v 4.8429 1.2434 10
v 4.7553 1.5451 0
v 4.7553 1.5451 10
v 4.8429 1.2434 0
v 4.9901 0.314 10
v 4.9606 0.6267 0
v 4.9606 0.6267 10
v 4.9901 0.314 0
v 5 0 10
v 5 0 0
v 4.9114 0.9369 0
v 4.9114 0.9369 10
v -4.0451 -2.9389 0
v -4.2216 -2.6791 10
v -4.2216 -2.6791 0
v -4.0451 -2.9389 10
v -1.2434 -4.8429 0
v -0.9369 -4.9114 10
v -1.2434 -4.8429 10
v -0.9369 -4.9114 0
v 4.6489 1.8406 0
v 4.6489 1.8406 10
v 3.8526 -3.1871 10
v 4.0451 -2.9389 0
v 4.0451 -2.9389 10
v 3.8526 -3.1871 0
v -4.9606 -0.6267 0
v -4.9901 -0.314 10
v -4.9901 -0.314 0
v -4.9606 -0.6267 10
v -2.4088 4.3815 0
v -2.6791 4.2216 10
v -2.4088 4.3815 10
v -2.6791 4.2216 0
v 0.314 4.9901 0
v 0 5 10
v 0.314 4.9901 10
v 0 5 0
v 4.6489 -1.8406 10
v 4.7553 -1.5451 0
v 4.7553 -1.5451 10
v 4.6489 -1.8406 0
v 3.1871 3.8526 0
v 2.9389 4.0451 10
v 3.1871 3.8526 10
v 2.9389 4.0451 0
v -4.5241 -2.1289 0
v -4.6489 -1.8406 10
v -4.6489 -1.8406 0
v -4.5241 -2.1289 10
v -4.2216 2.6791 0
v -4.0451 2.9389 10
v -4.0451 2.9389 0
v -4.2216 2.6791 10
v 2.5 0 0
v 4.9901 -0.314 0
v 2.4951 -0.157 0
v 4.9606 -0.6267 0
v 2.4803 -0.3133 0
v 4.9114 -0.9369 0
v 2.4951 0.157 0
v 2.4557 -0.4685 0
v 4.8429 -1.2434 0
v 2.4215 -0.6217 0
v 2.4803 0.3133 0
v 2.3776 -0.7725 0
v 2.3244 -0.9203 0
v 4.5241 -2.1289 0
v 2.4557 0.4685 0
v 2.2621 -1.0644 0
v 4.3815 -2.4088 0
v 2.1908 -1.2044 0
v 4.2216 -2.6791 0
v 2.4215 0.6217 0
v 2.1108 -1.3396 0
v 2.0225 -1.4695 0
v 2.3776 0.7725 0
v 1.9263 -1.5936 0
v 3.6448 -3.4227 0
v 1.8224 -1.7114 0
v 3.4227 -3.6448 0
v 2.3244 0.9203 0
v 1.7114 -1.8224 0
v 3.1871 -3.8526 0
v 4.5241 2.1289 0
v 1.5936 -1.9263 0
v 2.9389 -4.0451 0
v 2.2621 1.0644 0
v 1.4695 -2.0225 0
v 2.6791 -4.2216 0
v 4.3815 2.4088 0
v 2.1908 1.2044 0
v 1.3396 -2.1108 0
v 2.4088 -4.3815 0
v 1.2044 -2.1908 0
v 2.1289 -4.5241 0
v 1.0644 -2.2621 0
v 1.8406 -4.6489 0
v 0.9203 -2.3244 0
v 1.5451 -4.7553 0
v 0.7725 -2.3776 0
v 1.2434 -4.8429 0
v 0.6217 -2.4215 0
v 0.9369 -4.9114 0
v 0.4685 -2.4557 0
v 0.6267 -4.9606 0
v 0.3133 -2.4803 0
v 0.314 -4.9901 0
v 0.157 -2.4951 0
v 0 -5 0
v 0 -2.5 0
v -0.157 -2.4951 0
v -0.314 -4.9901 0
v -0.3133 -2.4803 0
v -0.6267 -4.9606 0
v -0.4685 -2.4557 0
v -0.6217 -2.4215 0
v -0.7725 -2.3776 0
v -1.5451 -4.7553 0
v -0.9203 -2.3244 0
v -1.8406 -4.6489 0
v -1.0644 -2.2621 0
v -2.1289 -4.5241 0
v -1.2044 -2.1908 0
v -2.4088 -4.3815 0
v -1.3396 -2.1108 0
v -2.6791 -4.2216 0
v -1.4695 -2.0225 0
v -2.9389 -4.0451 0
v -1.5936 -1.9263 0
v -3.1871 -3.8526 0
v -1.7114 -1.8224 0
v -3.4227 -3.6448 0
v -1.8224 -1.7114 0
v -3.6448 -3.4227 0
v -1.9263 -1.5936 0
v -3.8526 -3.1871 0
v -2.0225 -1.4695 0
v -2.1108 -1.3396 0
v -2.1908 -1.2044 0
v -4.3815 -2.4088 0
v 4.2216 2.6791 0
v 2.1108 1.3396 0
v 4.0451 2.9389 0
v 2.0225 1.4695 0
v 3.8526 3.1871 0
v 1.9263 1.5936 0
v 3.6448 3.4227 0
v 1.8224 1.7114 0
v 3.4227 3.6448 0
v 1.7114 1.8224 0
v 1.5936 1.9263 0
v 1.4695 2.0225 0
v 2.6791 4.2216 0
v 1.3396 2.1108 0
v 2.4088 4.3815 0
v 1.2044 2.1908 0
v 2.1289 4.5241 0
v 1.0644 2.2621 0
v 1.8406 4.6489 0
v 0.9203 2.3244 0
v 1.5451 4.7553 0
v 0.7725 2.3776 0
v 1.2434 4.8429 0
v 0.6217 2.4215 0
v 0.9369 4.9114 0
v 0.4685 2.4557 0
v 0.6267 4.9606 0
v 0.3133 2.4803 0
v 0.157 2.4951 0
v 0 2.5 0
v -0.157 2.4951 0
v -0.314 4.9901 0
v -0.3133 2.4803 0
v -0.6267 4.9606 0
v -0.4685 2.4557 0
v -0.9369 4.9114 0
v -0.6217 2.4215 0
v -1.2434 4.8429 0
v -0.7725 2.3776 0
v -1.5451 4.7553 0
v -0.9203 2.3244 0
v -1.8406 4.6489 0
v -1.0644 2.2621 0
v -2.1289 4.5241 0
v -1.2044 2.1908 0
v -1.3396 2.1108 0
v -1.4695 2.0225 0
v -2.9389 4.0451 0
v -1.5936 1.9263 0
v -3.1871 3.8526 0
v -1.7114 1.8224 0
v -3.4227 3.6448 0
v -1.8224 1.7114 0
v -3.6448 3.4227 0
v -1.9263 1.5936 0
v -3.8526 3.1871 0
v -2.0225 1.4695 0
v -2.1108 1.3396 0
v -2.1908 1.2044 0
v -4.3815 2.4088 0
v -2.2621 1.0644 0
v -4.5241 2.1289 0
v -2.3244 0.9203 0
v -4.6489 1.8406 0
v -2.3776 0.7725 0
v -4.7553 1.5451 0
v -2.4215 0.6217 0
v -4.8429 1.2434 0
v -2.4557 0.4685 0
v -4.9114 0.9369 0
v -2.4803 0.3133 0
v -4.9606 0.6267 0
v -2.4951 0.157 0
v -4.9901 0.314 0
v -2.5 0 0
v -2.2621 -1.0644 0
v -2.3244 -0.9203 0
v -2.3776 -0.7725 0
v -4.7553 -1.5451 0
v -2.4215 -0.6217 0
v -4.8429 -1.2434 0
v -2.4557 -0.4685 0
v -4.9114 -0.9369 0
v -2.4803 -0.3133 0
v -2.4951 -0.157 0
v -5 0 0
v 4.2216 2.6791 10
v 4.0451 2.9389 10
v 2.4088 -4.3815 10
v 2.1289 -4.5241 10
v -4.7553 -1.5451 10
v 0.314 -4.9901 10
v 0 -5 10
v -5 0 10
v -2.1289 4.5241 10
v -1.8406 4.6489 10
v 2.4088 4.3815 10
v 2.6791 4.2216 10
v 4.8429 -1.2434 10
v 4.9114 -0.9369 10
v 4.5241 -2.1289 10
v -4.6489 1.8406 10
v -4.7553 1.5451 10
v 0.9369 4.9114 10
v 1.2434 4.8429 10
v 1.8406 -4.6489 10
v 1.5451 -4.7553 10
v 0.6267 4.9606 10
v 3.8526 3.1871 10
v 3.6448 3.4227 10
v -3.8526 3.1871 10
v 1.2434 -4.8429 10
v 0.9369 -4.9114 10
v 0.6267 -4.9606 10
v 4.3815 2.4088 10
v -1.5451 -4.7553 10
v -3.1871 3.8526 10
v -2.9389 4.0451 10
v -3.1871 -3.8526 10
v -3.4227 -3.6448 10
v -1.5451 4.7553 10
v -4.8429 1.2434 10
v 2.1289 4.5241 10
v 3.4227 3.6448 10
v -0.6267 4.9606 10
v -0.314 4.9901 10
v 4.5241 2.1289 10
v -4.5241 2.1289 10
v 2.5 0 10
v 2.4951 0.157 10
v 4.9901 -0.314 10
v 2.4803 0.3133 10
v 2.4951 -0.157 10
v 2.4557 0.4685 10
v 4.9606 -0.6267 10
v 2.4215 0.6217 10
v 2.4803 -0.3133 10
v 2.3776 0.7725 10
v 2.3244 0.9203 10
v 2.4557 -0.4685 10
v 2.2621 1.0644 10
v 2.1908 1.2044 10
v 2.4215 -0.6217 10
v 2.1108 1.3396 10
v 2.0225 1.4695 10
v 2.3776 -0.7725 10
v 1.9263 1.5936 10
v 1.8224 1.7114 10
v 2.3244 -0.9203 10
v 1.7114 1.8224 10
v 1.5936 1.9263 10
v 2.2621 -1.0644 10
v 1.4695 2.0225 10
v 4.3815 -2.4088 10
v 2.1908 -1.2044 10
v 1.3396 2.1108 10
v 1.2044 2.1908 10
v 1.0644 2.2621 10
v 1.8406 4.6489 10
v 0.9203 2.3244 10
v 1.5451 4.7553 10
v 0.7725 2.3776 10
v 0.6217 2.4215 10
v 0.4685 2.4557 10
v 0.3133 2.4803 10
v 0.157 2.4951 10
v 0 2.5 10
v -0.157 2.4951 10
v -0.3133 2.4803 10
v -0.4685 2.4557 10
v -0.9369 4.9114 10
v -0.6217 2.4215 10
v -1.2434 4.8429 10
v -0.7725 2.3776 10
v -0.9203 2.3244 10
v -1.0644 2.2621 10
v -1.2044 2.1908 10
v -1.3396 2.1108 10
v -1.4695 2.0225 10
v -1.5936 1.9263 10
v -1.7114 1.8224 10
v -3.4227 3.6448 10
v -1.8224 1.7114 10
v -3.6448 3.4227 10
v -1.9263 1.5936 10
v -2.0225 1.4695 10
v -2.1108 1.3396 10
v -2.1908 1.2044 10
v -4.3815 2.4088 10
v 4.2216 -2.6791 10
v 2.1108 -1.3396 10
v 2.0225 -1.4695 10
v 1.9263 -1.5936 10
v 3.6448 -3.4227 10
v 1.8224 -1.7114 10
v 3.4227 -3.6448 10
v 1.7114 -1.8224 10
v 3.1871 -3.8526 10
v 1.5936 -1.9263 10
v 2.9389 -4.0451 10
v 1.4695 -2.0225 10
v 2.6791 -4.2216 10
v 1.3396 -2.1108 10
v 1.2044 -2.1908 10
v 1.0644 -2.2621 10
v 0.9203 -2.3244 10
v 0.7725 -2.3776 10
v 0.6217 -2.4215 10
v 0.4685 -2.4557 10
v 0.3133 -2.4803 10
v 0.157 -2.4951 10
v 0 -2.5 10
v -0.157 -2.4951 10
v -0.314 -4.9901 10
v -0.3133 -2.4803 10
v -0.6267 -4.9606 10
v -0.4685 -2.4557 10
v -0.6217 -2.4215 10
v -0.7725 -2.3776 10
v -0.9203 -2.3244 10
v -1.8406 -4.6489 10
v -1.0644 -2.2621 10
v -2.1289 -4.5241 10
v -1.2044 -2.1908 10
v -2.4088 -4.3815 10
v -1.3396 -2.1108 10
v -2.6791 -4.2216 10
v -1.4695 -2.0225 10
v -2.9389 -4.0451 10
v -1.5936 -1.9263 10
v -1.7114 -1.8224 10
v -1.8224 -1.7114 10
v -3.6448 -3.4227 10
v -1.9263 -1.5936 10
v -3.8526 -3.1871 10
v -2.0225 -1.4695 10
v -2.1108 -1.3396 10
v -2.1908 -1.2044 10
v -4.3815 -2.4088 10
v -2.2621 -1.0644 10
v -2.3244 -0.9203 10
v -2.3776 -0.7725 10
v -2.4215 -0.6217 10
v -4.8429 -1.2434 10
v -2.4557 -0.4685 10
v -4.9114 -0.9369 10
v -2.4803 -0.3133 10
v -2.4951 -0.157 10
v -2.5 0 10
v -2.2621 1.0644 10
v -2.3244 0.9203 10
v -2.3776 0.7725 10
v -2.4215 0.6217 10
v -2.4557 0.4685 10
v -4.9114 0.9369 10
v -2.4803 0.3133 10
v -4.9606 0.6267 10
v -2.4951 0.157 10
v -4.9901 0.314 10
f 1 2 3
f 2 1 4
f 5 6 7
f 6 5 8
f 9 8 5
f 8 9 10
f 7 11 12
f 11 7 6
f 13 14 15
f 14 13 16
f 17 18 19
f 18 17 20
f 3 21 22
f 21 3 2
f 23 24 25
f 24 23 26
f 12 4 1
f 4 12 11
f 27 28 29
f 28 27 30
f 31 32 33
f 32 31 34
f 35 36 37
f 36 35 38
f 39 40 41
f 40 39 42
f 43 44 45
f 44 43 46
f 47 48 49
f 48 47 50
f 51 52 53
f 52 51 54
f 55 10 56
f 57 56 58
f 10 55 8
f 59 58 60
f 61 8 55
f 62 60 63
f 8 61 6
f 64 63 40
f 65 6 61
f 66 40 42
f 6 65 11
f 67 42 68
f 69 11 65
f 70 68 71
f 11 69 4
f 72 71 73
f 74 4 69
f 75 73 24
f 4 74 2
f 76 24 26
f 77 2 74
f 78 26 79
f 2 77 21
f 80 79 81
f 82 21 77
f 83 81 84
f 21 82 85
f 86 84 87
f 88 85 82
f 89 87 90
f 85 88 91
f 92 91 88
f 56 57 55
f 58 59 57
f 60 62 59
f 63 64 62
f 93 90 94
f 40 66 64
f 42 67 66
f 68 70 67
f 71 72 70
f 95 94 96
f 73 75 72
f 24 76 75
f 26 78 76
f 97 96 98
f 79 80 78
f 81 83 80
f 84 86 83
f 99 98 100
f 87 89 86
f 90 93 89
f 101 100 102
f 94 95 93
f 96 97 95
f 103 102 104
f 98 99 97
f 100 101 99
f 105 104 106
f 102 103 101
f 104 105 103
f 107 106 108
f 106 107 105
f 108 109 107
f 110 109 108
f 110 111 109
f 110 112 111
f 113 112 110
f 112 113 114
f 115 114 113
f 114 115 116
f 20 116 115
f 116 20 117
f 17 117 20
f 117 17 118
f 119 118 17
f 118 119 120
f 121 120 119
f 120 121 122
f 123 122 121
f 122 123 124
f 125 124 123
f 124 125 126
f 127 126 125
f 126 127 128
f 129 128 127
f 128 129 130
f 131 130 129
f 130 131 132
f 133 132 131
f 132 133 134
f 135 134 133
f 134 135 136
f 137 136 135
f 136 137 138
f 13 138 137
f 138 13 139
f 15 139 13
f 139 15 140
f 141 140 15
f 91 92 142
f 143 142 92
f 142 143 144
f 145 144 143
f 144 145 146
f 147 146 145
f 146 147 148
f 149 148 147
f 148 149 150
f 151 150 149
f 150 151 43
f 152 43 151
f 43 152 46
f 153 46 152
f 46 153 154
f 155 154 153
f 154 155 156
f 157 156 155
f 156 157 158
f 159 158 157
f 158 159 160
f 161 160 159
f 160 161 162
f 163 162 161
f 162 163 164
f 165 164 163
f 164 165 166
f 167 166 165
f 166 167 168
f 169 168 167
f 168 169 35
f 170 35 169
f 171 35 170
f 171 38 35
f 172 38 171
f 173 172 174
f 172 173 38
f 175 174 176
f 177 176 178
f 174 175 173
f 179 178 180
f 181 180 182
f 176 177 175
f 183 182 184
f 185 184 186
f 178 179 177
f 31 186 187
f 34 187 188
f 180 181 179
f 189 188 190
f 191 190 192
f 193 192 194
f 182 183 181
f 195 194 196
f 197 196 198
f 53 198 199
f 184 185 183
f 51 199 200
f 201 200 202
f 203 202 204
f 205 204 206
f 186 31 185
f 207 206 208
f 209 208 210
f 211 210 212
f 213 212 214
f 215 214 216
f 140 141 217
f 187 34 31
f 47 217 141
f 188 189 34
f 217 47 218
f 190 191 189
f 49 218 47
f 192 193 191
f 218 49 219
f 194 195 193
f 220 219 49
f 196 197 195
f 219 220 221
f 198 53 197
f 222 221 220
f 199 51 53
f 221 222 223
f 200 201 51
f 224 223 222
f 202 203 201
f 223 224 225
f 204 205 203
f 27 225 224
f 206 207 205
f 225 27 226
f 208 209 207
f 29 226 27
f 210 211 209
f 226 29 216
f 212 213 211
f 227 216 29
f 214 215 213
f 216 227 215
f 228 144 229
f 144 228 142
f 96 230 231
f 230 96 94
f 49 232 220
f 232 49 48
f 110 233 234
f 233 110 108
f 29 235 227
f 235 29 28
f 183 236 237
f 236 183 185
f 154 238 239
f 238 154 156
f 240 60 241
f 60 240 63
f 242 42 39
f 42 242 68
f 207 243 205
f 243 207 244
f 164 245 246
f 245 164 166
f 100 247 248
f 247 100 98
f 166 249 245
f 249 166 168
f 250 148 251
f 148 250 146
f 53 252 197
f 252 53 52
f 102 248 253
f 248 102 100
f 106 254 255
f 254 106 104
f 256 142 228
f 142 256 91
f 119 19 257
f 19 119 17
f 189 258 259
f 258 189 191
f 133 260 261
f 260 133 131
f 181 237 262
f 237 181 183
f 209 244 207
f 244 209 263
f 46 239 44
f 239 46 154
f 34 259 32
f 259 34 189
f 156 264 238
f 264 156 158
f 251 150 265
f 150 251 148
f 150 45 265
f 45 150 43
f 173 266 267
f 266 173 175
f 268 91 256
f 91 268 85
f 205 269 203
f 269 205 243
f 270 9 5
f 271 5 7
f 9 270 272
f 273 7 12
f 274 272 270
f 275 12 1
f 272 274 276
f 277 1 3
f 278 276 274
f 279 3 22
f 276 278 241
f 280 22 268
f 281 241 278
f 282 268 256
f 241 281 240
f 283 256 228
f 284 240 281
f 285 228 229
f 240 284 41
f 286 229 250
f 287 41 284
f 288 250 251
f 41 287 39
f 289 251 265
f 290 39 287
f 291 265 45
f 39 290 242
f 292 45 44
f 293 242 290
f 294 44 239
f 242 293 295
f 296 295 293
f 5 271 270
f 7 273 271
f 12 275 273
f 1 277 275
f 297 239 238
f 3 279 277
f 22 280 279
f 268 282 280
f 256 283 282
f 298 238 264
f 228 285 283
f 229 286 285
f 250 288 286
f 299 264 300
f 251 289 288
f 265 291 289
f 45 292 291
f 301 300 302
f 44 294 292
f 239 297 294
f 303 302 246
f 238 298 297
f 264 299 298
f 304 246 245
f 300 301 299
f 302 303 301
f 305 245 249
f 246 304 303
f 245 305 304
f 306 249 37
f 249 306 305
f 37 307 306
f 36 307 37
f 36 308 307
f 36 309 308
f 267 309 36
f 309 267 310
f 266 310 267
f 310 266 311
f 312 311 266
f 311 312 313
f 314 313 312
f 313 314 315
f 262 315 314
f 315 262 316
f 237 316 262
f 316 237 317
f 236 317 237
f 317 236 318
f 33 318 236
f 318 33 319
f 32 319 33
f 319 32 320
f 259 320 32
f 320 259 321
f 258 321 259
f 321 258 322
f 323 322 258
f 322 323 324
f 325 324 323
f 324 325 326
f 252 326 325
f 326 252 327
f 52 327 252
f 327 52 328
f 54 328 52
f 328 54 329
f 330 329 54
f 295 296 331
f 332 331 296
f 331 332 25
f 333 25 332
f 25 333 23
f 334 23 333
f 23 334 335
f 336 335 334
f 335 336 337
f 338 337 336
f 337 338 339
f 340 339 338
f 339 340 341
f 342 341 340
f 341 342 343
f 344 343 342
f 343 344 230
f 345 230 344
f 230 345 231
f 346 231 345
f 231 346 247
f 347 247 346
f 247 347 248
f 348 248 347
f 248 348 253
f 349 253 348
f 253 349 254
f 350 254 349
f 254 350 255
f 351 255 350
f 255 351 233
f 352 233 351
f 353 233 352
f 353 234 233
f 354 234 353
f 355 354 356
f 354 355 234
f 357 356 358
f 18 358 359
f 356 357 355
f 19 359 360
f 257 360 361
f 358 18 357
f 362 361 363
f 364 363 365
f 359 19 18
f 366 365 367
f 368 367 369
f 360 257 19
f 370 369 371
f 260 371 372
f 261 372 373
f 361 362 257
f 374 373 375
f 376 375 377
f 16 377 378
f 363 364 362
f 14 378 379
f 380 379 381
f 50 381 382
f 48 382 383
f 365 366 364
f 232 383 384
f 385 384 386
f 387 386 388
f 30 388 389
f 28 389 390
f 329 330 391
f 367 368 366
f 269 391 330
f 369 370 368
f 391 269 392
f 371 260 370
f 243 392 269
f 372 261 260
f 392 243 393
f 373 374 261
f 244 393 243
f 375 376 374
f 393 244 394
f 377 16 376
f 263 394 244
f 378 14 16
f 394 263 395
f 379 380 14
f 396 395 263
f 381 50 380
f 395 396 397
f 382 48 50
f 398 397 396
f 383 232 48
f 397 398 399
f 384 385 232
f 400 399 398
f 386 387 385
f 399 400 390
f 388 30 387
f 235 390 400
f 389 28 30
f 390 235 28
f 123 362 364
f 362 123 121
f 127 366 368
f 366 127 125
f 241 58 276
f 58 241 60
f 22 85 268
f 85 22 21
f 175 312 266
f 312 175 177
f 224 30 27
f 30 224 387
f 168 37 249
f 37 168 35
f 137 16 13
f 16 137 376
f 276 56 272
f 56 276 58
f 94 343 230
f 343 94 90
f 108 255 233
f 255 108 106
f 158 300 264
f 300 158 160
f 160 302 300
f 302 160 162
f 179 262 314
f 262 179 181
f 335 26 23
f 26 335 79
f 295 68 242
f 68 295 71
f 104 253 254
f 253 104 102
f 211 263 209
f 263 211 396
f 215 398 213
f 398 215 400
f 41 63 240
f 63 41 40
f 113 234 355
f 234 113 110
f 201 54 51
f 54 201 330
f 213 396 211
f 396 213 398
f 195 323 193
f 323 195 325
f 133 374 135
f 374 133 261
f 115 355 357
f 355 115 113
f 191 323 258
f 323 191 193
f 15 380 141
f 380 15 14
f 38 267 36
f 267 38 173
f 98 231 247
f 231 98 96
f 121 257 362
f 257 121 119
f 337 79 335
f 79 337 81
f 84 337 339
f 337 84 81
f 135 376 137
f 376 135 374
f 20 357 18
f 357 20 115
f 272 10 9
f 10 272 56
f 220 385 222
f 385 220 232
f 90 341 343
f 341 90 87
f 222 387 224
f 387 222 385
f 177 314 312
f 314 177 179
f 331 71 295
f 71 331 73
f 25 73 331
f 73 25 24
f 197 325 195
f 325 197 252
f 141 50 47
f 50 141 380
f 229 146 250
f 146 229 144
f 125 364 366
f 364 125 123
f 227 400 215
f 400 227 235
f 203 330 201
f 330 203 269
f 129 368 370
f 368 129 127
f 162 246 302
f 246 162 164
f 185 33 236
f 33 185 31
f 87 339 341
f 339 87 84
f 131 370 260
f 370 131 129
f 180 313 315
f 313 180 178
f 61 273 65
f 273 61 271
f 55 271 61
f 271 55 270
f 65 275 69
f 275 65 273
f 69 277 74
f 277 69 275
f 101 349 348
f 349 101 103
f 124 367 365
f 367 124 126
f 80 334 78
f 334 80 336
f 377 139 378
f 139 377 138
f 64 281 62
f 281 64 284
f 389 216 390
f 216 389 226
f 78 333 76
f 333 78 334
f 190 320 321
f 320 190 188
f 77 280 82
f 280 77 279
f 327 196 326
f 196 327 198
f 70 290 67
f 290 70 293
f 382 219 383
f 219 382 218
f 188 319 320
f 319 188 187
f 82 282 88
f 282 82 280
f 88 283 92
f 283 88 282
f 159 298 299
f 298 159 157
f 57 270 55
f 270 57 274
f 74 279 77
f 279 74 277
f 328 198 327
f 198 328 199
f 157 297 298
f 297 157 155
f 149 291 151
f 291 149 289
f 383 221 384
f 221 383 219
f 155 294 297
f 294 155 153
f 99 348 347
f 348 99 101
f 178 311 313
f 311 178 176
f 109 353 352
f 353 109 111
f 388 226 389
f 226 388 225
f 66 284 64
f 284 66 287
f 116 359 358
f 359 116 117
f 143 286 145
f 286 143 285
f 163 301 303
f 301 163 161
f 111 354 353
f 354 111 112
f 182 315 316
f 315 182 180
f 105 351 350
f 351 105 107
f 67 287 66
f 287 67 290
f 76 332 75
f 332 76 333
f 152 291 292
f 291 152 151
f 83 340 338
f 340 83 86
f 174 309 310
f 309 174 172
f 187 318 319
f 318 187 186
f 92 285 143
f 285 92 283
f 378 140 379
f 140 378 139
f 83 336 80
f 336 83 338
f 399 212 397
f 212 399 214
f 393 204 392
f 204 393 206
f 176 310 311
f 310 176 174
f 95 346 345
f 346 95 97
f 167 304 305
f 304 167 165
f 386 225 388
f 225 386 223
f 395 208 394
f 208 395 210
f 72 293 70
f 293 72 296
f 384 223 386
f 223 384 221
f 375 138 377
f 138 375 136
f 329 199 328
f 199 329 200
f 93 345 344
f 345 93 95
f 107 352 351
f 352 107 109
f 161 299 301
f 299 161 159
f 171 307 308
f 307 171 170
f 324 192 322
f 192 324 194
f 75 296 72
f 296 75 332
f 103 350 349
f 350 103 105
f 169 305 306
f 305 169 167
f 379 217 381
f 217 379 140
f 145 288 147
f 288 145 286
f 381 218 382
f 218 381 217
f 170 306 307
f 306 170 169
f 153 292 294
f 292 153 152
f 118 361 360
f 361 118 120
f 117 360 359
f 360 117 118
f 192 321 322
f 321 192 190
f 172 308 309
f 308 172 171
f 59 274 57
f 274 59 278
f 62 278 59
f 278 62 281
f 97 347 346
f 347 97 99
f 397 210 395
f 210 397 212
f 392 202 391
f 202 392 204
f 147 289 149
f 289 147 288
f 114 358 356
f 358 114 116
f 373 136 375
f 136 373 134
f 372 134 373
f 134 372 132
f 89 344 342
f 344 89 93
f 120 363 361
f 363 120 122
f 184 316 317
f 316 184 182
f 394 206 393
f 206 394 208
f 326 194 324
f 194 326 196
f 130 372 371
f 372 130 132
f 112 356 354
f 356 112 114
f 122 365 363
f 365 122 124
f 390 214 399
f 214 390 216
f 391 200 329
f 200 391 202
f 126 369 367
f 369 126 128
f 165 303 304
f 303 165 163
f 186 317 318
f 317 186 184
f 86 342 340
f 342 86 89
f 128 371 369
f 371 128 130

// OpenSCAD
difference(){
    
    //translate([0,0,1])
    cylinder(10,5,5,$fn=100);
    cylinder(12,2.5,2.5,$fn=100);
    
}
